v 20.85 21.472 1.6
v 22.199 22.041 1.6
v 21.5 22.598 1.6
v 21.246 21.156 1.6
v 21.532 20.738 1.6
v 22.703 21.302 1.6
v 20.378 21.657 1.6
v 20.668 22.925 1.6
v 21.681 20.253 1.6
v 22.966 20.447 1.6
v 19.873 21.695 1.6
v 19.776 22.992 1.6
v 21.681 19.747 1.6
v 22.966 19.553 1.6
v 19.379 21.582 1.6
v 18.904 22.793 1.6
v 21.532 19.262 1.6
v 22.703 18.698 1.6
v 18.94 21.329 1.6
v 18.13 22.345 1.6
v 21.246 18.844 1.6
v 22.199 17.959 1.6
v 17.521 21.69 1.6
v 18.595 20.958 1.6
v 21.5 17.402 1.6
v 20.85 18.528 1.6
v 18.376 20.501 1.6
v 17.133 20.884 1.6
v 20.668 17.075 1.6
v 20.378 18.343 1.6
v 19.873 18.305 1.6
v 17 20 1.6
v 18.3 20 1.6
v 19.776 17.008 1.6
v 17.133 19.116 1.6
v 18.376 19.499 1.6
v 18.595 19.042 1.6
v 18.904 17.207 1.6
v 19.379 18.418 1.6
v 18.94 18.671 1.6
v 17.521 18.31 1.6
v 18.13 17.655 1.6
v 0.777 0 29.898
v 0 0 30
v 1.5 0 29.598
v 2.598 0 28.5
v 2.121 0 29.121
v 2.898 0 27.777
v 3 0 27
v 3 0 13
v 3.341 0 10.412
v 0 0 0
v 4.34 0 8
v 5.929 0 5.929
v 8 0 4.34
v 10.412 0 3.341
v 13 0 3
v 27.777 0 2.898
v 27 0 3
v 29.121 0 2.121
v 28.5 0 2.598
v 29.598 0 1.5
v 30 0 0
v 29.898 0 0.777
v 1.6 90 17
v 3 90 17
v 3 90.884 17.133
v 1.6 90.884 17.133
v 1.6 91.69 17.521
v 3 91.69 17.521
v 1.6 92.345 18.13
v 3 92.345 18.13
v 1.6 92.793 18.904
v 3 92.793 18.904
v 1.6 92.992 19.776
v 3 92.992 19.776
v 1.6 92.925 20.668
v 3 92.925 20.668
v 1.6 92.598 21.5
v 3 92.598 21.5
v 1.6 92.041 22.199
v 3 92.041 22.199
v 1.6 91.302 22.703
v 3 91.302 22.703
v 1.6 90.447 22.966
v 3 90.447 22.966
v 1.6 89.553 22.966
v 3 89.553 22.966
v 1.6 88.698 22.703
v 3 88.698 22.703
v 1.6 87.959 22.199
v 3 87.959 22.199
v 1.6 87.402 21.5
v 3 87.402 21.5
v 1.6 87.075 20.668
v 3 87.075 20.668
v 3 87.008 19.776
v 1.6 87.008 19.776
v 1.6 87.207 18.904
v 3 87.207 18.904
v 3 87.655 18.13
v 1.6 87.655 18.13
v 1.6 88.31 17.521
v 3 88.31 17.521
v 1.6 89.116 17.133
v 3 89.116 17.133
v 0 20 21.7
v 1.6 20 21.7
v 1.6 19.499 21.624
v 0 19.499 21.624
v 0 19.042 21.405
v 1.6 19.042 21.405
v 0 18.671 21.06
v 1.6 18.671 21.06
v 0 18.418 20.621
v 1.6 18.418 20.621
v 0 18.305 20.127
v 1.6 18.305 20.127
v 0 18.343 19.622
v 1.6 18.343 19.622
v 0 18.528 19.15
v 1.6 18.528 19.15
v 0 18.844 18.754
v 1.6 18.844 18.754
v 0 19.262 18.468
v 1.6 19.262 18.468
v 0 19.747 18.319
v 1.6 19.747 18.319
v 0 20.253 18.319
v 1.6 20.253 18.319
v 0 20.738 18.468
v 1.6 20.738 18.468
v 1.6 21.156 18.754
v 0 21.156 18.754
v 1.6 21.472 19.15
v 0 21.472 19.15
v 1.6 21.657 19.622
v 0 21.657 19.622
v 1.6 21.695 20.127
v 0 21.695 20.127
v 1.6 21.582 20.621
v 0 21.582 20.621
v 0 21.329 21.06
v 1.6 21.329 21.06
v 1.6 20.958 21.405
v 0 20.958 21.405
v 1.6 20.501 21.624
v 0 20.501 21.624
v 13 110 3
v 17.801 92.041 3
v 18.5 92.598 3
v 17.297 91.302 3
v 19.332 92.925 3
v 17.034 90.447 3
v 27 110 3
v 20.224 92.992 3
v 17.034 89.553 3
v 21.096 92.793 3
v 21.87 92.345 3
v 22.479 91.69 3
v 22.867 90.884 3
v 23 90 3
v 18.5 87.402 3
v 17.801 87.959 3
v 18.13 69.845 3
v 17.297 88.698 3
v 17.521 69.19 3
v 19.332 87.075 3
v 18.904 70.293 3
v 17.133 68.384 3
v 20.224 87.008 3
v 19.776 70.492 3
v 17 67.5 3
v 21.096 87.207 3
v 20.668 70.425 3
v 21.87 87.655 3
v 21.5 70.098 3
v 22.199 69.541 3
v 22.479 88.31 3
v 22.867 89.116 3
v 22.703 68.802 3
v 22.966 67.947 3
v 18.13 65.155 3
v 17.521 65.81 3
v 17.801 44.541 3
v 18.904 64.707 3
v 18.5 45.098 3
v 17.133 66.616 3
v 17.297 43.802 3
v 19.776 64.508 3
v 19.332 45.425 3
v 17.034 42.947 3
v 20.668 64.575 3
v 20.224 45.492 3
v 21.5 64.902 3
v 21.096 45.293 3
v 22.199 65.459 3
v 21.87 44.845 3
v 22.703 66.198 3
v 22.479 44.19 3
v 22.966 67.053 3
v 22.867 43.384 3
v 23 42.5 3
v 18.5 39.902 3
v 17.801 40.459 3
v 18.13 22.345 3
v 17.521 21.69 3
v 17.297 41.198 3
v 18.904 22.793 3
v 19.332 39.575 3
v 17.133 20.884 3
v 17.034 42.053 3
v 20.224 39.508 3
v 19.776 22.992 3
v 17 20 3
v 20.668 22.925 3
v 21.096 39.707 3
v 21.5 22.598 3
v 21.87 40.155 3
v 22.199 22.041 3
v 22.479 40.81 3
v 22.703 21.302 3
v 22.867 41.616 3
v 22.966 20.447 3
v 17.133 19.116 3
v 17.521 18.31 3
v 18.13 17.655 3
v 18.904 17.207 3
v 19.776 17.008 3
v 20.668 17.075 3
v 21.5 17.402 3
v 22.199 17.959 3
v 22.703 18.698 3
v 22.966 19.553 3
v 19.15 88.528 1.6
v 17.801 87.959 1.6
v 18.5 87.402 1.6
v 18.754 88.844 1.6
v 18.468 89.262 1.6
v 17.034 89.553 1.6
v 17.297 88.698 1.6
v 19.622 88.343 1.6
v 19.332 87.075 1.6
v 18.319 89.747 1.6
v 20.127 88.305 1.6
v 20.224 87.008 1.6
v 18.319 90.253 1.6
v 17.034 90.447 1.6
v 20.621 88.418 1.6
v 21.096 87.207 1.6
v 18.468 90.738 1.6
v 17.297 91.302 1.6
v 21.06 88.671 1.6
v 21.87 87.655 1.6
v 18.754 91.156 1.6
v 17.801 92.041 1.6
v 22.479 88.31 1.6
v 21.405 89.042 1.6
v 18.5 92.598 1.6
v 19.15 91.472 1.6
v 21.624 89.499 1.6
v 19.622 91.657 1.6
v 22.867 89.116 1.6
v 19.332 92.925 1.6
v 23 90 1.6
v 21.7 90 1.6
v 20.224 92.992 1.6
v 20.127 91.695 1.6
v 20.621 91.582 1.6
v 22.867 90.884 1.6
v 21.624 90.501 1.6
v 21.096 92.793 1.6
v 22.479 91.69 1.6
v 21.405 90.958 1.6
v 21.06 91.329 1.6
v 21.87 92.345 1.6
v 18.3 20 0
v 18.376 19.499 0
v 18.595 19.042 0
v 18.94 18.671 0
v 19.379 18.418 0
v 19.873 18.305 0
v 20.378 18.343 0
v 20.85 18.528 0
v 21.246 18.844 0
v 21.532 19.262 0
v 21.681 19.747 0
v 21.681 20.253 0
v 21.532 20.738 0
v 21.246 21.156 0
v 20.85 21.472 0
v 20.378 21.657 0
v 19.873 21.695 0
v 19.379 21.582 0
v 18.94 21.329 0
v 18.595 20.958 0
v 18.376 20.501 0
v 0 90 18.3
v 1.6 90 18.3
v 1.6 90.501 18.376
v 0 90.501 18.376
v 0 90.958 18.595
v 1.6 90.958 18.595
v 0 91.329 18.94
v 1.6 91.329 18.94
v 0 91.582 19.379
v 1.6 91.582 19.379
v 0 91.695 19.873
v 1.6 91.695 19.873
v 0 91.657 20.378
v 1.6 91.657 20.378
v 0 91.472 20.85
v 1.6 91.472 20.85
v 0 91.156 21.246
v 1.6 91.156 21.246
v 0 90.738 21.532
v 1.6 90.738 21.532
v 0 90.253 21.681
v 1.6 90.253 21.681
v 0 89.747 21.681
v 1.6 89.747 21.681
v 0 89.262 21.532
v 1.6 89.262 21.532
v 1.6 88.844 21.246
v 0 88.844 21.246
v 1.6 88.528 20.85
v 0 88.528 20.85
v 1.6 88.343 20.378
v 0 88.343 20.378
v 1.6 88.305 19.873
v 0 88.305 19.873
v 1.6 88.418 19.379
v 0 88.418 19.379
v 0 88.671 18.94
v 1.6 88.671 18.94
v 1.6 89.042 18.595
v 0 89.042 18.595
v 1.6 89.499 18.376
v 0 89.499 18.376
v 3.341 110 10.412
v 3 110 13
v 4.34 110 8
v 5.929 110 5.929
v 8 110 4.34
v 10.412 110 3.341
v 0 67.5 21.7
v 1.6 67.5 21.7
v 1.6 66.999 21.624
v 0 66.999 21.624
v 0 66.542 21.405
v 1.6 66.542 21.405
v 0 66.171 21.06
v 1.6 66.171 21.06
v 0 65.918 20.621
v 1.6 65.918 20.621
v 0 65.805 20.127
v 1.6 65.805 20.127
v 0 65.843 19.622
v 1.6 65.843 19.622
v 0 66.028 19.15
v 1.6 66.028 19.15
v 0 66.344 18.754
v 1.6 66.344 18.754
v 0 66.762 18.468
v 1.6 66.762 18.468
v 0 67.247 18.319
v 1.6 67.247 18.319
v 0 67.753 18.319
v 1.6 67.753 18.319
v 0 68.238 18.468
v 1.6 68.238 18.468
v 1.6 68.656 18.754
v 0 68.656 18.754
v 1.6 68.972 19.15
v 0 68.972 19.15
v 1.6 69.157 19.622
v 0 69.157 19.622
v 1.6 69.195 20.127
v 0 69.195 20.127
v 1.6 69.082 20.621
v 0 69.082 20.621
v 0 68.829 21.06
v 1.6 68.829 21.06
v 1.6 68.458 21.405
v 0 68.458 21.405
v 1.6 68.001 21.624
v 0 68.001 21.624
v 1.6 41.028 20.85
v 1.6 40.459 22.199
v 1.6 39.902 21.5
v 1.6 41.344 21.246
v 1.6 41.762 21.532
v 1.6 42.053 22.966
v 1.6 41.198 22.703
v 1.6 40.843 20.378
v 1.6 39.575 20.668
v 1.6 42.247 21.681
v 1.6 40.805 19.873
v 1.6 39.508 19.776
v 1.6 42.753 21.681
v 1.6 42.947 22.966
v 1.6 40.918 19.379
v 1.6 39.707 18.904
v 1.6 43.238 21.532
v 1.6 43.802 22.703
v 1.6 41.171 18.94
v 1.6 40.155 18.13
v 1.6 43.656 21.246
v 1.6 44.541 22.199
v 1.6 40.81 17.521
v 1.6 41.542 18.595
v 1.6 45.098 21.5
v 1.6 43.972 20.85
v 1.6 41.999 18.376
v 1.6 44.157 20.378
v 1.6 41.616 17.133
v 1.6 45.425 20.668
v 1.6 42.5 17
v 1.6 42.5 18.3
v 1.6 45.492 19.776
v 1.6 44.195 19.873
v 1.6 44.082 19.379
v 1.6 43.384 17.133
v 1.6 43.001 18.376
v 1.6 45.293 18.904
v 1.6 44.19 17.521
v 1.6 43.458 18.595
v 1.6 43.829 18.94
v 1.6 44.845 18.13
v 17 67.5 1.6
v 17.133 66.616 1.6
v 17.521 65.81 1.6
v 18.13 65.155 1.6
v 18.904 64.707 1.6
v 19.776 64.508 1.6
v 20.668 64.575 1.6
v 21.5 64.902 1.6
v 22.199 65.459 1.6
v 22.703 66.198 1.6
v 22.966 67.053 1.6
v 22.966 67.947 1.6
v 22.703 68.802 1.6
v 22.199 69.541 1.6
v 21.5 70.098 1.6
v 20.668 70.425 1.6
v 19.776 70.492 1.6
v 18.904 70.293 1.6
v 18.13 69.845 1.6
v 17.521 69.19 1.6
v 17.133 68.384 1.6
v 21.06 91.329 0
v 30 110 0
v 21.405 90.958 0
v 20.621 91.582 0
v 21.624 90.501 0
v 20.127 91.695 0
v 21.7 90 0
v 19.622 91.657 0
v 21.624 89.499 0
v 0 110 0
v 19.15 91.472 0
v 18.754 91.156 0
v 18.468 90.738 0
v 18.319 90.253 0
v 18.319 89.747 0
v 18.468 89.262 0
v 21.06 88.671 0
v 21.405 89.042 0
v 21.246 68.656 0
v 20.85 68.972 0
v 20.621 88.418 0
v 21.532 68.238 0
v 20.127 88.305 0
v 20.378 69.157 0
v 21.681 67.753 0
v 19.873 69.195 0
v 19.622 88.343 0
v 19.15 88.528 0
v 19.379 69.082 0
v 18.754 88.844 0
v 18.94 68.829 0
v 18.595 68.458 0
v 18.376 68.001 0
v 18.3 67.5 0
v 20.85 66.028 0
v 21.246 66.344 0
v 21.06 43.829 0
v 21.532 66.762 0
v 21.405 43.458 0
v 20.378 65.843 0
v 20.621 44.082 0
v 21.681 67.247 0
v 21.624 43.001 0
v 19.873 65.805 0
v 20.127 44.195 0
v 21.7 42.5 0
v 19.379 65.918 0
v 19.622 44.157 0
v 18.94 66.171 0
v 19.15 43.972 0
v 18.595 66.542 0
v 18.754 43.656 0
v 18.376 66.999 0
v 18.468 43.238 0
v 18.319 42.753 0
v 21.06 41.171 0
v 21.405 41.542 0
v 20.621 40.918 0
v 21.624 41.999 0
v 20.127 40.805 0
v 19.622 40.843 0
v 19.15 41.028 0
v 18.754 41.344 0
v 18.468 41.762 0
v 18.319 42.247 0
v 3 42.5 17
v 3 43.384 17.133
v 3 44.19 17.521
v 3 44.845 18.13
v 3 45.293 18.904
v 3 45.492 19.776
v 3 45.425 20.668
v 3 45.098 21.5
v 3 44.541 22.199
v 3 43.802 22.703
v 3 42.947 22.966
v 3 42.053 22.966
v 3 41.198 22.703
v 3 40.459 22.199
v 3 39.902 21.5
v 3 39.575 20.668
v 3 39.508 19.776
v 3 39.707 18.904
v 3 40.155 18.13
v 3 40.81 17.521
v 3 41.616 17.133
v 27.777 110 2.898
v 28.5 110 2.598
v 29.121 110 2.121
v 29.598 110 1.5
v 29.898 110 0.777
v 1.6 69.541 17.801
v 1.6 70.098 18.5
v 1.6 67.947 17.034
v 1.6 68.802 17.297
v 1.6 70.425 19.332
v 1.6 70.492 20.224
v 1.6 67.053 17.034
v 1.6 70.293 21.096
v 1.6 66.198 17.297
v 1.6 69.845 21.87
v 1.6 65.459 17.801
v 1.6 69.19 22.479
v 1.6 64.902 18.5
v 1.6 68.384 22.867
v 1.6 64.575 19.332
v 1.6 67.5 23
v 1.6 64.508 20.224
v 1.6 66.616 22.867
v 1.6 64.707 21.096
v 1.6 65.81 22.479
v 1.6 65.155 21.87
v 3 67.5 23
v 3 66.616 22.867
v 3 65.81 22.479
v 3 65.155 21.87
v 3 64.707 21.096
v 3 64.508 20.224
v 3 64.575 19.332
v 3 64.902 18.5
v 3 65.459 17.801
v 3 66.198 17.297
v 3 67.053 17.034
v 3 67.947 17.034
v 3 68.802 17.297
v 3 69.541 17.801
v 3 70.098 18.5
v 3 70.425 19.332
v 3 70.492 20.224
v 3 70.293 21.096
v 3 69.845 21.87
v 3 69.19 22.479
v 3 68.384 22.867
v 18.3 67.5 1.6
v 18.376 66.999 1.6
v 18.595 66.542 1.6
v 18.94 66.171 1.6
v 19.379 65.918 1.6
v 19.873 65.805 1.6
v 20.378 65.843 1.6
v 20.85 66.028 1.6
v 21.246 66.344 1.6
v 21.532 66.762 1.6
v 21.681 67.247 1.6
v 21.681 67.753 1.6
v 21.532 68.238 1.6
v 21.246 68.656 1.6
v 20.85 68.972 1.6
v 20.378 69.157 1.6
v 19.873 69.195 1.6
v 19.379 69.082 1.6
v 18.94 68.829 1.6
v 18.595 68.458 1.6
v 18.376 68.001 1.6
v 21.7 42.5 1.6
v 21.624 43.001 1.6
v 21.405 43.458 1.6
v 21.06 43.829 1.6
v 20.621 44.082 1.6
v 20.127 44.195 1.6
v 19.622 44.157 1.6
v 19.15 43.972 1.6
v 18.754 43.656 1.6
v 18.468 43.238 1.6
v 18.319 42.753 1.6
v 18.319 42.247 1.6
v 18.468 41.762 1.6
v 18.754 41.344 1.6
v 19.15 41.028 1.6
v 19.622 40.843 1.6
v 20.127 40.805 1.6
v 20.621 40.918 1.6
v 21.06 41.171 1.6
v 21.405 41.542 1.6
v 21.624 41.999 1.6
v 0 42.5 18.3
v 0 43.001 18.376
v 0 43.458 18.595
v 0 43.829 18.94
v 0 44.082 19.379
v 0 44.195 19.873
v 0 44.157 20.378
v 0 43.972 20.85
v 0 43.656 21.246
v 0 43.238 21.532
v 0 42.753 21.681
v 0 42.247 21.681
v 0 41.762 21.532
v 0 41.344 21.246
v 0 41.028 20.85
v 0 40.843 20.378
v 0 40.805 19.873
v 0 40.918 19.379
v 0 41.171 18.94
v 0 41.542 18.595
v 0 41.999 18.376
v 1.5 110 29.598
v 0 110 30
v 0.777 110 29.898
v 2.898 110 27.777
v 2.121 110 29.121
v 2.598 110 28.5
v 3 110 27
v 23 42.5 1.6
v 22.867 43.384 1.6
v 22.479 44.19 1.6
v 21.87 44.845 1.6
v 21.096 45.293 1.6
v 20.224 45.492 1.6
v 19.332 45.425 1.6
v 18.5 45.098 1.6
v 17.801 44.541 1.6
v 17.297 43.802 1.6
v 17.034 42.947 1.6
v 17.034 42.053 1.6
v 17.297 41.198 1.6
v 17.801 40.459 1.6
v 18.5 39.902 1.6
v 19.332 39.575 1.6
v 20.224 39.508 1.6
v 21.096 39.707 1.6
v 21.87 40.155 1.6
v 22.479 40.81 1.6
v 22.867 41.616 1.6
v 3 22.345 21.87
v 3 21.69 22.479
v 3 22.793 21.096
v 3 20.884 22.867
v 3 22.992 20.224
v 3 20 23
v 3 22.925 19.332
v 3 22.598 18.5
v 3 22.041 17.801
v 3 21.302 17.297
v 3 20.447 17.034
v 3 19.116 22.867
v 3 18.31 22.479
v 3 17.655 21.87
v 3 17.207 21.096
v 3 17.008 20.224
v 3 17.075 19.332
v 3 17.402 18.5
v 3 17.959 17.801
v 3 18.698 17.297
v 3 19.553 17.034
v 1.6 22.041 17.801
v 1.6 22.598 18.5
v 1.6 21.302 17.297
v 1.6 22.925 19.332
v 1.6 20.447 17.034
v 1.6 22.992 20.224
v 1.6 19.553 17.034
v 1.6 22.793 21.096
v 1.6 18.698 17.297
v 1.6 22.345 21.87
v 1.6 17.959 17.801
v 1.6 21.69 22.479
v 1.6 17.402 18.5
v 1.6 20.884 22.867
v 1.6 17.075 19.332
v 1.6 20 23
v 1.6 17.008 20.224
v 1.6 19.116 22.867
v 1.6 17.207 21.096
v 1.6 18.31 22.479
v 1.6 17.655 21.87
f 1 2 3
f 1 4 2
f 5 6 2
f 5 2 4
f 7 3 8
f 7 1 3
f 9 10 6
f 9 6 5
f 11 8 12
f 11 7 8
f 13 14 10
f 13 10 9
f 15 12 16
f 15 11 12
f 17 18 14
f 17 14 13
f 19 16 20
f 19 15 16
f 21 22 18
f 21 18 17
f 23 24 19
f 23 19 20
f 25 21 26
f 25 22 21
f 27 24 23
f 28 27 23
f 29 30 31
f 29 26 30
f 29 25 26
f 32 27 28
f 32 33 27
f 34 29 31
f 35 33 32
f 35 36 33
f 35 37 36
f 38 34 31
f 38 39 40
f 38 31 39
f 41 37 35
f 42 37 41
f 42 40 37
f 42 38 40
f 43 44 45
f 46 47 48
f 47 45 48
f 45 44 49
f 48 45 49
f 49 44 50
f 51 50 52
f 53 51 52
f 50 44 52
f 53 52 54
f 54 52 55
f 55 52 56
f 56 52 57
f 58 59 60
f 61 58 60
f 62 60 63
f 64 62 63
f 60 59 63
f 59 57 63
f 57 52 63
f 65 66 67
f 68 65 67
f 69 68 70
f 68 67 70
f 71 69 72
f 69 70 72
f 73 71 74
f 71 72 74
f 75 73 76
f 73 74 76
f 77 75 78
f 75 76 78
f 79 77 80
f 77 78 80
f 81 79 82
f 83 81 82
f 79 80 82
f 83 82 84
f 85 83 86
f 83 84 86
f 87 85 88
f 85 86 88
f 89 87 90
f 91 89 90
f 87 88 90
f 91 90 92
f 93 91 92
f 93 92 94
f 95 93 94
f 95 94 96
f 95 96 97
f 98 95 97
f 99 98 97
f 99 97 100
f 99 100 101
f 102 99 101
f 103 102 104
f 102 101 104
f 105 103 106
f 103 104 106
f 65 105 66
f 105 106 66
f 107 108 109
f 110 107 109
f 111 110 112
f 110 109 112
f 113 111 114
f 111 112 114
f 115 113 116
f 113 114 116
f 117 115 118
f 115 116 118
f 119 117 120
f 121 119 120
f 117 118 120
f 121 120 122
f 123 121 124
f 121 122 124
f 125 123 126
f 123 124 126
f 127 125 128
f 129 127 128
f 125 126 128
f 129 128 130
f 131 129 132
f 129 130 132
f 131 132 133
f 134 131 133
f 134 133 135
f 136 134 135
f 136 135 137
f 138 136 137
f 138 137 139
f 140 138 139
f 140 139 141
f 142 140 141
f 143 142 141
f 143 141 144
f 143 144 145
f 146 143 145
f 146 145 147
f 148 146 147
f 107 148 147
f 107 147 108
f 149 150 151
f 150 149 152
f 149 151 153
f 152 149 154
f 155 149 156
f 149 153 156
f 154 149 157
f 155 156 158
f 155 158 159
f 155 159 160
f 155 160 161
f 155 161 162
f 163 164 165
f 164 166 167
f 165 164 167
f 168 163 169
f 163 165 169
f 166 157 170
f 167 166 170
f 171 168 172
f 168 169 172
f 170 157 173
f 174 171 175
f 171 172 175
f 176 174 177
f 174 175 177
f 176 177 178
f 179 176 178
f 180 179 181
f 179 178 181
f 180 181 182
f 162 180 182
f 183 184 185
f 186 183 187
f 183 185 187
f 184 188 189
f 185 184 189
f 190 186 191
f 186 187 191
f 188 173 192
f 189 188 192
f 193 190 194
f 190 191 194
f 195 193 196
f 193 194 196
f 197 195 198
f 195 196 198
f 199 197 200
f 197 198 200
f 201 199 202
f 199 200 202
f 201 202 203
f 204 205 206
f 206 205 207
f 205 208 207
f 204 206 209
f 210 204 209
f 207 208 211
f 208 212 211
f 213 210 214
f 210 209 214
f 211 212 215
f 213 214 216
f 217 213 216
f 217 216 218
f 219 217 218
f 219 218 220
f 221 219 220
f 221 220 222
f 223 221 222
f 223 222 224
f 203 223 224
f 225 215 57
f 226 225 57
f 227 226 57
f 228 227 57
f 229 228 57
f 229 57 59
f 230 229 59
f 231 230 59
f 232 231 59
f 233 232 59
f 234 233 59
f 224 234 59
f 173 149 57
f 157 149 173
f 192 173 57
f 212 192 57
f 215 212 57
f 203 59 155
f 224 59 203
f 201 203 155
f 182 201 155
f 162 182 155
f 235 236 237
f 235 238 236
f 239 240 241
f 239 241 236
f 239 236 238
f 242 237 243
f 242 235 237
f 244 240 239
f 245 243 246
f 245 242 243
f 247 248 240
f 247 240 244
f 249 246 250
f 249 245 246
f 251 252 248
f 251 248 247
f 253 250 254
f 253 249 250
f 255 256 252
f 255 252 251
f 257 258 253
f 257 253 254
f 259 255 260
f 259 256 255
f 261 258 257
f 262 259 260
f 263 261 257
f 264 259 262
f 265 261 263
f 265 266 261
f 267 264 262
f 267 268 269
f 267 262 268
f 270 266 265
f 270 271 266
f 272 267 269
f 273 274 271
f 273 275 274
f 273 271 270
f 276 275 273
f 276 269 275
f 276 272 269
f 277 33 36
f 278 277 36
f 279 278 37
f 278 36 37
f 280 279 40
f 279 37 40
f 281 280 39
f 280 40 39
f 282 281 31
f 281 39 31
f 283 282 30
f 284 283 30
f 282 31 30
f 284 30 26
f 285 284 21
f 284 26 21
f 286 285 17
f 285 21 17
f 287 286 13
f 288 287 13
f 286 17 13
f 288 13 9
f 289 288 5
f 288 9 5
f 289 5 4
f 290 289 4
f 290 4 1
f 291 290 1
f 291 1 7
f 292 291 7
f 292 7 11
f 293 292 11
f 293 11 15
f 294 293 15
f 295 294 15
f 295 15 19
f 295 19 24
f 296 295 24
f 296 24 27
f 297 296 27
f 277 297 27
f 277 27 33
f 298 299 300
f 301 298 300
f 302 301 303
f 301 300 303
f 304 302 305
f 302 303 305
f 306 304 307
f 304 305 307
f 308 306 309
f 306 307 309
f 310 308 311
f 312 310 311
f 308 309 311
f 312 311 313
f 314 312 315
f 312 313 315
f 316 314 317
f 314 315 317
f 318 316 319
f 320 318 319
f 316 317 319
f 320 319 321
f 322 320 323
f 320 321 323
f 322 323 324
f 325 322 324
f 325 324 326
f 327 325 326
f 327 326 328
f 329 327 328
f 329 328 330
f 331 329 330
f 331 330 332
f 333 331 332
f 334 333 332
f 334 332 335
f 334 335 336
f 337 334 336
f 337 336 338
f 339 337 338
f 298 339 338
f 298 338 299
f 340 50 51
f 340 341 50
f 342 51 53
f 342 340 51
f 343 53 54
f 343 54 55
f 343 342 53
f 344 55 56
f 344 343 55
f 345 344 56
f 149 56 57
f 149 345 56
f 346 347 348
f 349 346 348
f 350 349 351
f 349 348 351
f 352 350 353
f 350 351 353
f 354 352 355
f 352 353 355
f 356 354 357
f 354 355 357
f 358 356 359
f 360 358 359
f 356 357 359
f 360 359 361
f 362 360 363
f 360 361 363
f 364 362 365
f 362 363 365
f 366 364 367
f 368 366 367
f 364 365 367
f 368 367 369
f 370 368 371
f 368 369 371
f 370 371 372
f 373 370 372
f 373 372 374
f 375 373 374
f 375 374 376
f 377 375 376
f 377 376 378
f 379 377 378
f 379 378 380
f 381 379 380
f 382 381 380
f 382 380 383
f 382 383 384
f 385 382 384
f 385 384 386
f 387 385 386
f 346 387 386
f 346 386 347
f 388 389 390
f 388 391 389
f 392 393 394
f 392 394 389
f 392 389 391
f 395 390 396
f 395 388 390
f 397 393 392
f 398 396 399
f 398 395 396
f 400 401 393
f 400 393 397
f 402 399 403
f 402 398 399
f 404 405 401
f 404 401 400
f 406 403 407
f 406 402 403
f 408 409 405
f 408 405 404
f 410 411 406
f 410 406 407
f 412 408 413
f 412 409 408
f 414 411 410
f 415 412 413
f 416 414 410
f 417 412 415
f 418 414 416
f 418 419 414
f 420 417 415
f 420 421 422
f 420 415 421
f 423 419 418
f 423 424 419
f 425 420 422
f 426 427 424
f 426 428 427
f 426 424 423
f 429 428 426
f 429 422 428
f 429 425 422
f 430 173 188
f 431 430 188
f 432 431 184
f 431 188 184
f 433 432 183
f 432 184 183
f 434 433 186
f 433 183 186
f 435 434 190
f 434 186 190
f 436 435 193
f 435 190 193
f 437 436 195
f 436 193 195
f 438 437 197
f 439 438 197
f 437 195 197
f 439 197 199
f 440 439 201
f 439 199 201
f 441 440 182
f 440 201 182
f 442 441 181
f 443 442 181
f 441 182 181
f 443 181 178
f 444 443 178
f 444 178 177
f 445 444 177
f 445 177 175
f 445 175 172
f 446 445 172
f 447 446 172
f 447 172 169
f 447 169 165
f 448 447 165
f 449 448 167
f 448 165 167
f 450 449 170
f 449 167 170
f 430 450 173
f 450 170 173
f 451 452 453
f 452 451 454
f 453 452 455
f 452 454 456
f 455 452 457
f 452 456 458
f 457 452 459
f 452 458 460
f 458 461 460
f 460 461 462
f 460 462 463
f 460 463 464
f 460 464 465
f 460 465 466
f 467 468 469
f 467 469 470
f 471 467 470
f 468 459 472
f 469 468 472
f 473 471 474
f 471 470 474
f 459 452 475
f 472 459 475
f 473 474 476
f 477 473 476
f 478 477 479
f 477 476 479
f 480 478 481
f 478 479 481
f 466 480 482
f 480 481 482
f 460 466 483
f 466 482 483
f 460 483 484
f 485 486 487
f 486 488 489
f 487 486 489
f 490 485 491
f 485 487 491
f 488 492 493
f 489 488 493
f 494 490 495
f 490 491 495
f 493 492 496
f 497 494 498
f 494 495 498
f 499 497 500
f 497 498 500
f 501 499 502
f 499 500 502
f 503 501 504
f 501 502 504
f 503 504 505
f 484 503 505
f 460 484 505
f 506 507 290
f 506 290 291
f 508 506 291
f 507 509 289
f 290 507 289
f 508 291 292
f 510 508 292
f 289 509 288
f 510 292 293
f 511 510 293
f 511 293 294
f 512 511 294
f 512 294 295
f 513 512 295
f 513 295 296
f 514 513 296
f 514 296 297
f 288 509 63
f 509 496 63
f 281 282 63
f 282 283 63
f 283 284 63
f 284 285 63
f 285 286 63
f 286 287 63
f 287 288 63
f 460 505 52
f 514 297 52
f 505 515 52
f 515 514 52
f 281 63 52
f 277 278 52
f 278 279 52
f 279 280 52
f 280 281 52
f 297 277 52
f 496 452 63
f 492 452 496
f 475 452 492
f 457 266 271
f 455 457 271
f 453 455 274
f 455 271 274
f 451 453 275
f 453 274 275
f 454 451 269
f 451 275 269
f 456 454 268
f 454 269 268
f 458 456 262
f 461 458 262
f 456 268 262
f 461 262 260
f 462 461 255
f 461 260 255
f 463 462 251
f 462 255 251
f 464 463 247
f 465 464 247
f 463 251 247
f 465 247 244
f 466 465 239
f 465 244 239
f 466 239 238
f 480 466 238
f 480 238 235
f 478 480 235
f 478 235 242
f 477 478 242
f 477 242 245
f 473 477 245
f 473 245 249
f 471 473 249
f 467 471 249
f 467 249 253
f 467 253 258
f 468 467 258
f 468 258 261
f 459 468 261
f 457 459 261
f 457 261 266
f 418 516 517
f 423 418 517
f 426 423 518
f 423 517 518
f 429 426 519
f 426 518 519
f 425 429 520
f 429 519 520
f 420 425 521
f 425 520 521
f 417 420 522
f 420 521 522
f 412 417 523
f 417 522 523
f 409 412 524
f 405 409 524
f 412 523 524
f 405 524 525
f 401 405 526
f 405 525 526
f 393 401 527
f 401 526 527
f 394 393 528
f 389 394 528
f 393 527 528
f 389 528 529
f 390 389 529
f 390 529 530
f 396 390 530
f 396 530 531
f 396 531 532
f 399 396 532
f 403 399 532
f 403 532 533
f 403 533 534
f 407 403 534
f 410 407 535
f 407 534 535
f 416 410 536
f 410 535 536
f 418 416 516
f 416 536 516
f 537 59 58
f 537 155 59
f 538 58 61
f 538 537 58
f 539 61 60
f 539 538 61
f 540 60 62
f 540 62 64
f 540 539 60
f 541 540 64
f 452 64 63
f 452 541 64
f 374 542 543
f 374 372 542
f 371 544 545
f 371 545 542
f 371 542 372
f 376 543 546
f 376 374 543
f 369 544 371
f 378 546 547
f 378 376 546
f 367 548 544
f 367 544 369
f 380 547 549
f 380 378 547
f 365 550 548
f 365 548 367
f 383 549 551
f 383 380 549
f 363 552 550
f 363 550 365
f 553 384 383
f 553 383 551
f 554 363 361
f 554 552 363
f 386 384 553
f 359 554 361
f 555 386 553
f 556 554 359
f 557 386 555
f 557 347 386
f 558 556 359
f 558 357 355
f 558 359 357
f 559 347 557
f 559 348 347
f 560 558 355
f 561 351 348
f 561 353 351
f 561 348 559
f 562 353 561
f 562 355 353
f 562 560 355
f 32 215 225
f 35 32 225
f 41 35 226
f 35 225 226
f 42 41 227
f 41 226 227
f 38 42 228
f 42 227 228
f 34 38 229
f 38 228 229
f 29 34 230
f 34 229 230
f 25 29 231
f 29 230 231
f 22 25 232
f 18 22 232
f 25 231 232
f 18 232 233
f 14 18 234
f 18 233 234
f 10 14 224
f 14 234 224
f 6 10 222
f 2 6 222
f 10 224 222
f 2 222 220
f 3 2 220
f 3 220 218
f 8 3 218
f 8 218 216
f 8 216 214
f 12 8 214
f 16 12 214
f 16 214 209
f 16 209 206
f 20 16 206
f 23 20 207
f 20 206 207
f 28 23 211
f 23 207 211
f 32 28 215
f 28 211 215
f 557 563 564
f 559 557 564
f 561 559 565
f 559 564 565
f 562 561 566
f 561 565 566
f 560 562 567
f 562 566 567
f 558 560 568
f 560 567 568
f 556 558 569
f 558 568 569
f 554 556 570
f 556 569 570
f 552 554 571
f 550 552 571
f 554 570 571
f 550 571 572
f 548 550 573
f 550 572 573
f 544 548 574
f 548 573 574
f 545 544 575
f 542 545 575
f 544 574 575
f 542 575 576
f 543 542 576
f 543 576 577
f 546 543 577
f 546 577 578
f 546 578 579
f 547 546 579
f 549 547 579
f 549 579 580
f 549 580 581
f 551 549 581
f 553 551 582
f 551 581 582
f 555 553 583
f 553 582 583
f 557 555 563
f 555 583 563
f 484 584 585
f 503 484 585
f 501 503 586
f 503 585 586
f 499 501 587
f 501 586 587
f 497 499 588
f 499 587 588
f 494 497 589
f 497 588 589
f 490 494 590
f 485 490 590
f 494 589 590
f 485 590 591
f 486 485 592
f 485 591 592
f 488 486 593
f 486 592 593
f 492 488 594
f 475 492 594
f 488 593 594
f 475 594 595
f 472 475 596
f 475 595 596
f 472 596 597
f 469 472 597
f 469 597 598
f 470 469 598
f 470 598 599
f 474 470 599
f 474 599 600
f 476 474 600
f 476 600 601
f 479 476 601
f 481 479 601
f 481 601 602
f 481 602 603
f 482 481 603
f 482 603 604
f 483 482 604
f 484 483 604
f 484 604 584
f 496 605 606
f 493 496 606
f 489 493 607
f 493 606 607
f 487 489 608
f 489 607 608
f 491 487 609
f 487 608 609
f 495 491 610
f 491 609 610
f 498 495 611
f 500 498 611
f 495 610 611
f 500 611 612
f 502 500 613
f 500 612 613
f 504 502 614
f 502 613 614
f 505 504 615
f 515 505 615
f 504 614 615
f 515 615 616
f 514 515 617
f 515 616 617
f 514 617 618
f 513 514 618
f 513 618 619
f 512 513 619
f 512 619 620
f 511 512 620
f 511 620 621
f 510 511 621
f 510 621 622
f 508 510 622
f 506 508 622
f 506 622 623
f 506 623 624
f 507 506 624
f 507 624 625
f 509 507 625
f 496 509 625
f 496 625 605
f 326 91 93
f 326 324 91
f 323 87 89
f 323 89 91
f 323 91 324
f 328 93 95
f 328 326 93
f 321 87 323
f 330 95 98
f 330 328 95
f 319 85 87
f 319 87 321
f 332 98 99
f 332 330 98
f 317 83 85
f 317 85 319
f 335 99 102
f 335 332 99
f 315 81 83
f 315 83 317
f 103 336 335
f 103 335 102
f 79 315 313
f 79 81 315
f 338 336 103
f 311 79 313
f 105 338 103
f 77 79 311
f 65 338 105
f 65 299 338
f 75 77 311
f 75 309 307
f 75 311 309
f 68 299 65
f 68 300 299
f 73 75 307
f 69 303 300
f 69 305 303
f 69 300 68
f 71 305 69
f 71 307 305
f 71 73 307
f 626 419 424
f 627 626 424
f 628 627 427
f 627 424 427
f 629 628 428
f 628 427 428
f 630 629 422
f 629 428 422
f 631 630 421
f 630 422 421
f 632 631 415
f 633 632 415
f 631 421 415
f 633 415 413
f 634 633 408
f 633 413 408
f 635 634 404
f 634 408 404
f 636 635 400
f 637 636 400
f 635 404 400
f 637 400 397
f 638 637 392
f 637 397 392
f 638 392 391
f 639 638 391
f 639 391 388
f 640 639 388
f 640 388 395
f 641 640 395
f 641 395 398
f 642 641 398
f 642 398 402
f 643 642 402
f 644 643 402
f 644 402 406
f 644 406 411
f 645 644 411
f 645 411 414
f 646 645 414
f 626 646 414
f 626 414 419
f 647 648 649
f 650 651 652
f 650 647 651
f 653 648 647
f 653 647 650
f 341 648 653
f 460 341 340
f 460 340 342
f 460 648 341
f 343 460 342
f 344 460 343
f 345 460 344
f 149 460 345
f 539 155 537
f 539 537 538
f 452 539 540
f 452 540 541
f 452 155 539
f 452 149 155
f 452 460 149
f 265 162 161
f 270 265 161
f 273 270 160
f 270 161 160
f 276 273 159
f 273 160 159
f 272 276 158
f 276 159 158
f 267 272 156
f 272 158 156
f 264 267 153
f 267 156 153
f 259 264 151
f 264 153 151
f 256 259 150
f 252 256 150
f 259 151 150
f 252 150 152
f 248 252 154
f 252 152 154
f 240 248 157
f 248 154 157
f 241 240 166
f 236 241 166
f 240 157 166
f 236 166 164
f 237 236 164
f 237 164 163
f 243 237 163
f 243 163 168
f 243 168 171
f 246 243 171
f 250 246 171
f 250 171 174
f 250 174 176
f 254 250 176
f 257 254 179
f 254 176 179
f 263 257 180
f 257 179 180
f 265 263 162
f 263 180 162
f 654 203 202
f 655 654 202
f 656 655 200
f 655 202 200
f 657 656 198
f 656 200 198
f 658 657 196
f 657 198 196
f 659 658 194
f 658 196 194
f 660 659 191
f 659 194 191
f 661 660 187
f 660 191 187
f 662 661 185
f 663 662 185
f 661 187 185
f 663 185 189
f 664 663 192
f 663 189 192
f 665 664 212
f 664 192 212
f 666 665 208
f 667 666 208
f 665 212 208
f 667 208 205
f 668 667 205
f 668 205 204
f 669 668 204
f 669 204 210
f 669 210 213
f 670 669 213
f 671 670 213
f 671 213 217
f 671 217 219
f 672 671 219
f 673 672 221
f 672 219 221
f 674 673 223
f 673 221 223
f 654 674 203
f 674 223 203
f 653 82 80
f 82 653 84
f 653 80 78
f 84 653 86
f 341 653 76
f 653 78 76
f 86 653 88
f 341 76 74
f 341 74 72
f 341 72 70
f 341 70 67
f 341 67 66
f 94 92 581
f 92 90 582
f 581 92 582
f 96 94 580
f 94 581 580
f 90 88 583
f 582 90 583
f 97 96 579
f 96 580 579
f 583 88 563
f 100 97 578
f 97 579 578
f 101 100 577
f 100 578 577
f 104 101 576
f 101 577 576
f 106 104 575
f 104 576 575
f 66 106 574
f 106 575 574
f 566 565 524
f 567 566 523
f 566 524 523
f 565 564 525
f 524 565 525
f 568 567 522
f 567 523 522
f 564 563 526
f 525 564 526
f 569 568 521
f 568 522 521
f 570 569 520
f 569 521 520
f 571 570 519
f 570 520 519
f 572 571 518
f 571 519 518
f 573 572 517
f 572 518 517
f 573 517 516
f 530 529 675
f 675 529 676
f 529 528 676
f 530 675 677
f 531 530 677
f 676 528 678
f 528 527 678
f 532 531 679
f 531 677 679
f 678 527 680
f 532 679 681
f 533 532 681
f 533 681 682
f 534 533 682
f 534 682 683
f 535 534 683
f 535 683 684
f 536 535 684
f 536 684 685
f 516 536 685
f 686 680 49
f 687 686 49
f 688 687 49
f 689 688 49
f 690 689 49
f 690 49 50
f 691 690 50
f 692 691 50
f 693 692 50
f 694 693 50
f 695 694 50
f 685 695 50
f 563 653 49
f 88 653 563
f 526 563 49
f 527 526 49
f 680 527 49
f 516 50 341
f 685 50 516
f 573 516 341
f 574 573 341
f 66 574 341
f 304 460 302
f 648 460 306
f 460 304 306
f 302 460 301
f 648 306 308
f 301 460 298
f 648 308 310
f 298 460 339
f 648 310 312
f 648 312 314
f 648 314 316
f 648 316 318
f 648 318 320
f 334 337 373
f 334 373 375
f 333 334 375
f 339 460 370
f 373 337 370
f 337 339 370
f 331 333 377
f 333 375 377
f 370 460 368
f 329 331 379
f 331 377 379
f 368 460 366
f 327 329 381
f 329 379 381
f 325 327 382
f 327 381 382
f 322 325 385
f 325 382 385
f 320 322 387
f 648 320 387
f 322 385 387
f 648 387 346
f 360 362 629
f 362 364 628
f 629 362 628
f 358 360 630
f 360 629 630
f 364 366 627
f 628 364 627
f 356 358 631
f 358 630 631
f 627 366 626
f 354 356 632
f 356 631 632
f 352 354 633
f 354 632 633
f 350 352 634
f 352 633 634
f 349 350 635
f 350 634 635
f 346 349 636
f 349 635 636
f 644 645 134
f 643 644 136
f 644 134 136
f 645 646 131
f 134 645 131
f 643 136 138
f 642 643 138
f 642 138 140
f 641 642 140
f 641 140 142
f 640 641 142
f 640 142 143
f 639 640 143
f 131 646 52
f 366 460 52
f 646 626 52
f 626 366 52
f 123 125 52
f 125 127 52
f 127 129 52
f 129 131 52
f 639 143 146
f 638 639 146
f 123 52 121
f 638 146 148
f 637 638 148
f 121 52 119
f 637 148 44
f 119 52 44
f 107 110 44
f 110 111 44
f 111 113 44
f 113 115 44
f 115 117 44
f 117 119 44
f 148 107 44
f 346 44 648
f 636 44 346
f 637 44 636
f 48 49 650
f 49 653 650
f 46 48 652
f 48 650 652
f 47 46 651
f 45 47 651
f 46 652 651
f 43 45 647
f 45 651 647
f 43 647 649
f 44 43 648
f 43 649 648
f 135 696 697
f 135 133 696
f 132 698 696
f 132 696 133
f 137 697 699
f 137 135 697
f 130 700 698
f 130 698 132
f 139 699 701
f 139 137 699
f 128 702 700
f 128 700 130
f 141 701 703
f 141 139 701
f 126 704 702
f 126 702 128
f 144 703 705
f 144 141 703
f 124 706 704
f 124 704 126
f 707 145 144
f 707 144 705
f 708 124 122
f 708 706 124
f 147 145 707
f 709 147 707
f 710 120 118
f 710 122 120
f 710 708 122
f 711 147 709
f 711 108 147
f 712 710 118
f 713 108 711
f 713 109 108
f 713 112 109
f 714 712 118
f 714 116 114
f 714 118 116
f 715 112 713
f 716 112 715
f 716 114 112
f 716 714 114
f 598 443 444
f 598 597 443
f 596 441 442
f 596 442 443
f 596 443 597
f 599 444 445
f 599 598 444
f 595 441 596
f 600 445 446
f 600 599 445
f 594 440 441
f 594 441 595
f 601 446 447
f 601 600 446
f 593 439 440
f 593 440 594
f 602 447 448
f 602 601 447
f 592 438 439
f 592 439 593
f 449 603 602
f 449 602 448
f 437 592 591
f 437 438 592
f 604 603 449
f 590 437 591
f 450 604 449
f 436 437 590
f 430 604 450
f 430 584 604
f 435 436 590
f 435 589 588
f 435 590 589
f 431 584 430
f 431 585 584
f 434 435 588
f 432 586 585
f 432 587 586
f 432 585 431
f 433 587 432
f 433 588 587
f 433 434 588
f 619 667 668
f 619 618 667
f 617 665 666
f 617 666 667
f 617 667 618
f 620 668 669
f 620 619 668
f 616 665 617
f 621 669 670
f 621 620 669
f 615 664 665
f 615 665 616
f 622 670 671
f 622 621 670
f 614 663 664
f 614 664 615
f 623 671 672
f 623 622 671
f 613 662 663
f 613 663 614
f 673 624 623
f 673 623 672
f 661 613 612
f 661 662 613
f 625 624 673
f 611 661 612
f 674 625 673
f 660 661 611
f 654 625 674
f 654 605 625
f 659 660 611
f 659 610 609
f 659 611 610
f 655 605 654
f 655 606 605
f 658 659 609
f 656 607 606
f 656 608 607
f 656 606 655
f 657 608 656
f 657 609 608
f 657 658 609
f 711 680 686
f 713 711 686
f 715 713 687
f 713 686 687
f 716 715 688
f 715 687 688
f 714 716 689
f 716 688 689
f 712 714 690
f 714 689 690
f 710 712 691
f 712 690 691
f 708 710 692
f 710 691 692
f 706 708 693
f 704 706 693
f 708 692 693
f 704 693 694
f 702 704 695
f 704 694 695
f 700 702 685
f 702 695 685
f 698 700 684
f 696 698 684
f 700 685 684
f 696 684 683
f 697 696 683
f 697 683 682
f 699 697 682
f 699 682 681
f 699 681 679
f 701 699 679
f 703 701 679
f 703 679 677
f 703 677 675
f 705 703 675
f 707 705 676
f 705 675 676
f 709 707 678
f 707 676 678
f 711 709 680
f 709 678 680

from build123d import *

# Parameters (mm, degrees)
BOSS_EXTRUDE1_DEPTH = 110
FILLET1_R           = 10
FILLET2_R           = 3
SKETCH2_R           = 1.7
CUT_EXTRUDE1_DEPTH  = 118.170815479
SKETCH3_R           = 1.7
CUT_EXTRUDE2_DEPTH  = 118.170815479
SKETCH4_R           = 3
CUT_EXTRUDE3_DEPTH  = 1.4
SKETCH5_R           = 3
CUT_EXTRUDE4_DEPTH  = 1.4


with BuildPart() as part:
    # Sketch1 → Boss-Extrude1 (new body)
    with BuildSketch(Plane(origin=(0, 0, 0), x_dir=(1, 0, 0), z_dir=(0, 1, 0))):
        Polygon((0, 0), (0, -30), (3, -30), (3, -3), (30, -3), (30, 0), align=None)
    extrude(amount=BOSS_EXTRUDE1_DEPTH)

    # Fillet1
    fillet1_edges = [part.edges().sort_by_distance(p)[0] for p in [
        (3, 55, 3),
    ]]
    fillet(fillet1_edges, radius=FILLET1_R)

    # Fillet2
    fillet2_edges = [part.edges().sort_by_distance(p)[0] for p in [
        (3, 55, 30),
        (30, 55, 3),
    ]]
    fillet(fillet2_edges, radius=FILLET2_R - 0.0001)  # a hair under: the kernel refuses the full size

    # Sketch2 → Cut-Extrude1 (cut, through all)
    with BuildSketch(Plane.XY.offset(3)):
        with Locations((20, 90)):
            Circle(SKETCH2_R)
        with Locations(Location((20, 67.5, 0), (0, 0, 180))):
            Circle(SKETCH2_R)
        with Locations((20, 42.5)):
            Circle(SKETCH2_R)
        with Locations(Location((20, 20, 0), (0, 0, 180))):
            Circle(SKETCH2_R)
    extrude(amount=-CUT_EXTRUDE1_DEPTH, mode=Mode.SUBTRACT)

    # Sketch3 → Cut-Extrude2 (cut, through all)
    with BuildSketch(Plane(origin=(3, 0, 0), x_dir=(0, 0, -1), z_dir=(1, 0, 0))):
        with Locations((-20, 90)):
            Circle(SKETCH3_R)
        with Locations(Location((-20, 67.5, 0), (0, 0, 180))):
            Circle(SKETCH3_R)
        with Locations((-20, 42.5)):
            Circle(SKETCH3_R)
        with Locations(Location((-20, 20, 0), (0, 0, 180))):
            Circle(SKETCH3_R)
    extrude(amount=-CUT_EXTRUDE2_DEPTH, mode=Mode.SUBTRACT)

    # Sketch4 → Cut-Extrude3 (cut)
    with BuildSketch(Plane.XY.offset(3)):
        with Locations((20, 90)):
            Circle(SKETCH4_R)
        with Locations(Location((20, 67.5, 0), (0, 0, 180))):
            Circle(SKETCH4_R)
        with Locations((20, 42.5)):
            Circle(SKETCH4_R)
        with Locations(Location((20, 20, 0), (0, 0, 180))):
            Circle(SKETCH4_R)
    extrude(amount=-CUT_EXTRUDE3_DEPTH, mode=Mode.SUBTRACT)

    # Sketch5 → Cut-Extrude4 (cut)
    with BuildSketch(Plane(origin=(3, 0, 0), x_dir=(0, 0, -1), z_dir=(1, 0, 0))):
        with Locations((-20, 90)):
            Circle(SKETCH5_R)
        with Locations(Location((-20, 67.5, 0), (0, 0, 180))):
            Circle(SKETCH5_R)
        with Locations((-20, 42.5)):
            Circle(SKETCH5_R)
        with Locations(Location((-20, 20, 0), (0, 0, 180))):
            Circle(SKETCH5_R)
    extrude(amount=-CUT_EXTRUDE4_DEPTH, mode=Mode.SUBTRACT)


solid = part.part
